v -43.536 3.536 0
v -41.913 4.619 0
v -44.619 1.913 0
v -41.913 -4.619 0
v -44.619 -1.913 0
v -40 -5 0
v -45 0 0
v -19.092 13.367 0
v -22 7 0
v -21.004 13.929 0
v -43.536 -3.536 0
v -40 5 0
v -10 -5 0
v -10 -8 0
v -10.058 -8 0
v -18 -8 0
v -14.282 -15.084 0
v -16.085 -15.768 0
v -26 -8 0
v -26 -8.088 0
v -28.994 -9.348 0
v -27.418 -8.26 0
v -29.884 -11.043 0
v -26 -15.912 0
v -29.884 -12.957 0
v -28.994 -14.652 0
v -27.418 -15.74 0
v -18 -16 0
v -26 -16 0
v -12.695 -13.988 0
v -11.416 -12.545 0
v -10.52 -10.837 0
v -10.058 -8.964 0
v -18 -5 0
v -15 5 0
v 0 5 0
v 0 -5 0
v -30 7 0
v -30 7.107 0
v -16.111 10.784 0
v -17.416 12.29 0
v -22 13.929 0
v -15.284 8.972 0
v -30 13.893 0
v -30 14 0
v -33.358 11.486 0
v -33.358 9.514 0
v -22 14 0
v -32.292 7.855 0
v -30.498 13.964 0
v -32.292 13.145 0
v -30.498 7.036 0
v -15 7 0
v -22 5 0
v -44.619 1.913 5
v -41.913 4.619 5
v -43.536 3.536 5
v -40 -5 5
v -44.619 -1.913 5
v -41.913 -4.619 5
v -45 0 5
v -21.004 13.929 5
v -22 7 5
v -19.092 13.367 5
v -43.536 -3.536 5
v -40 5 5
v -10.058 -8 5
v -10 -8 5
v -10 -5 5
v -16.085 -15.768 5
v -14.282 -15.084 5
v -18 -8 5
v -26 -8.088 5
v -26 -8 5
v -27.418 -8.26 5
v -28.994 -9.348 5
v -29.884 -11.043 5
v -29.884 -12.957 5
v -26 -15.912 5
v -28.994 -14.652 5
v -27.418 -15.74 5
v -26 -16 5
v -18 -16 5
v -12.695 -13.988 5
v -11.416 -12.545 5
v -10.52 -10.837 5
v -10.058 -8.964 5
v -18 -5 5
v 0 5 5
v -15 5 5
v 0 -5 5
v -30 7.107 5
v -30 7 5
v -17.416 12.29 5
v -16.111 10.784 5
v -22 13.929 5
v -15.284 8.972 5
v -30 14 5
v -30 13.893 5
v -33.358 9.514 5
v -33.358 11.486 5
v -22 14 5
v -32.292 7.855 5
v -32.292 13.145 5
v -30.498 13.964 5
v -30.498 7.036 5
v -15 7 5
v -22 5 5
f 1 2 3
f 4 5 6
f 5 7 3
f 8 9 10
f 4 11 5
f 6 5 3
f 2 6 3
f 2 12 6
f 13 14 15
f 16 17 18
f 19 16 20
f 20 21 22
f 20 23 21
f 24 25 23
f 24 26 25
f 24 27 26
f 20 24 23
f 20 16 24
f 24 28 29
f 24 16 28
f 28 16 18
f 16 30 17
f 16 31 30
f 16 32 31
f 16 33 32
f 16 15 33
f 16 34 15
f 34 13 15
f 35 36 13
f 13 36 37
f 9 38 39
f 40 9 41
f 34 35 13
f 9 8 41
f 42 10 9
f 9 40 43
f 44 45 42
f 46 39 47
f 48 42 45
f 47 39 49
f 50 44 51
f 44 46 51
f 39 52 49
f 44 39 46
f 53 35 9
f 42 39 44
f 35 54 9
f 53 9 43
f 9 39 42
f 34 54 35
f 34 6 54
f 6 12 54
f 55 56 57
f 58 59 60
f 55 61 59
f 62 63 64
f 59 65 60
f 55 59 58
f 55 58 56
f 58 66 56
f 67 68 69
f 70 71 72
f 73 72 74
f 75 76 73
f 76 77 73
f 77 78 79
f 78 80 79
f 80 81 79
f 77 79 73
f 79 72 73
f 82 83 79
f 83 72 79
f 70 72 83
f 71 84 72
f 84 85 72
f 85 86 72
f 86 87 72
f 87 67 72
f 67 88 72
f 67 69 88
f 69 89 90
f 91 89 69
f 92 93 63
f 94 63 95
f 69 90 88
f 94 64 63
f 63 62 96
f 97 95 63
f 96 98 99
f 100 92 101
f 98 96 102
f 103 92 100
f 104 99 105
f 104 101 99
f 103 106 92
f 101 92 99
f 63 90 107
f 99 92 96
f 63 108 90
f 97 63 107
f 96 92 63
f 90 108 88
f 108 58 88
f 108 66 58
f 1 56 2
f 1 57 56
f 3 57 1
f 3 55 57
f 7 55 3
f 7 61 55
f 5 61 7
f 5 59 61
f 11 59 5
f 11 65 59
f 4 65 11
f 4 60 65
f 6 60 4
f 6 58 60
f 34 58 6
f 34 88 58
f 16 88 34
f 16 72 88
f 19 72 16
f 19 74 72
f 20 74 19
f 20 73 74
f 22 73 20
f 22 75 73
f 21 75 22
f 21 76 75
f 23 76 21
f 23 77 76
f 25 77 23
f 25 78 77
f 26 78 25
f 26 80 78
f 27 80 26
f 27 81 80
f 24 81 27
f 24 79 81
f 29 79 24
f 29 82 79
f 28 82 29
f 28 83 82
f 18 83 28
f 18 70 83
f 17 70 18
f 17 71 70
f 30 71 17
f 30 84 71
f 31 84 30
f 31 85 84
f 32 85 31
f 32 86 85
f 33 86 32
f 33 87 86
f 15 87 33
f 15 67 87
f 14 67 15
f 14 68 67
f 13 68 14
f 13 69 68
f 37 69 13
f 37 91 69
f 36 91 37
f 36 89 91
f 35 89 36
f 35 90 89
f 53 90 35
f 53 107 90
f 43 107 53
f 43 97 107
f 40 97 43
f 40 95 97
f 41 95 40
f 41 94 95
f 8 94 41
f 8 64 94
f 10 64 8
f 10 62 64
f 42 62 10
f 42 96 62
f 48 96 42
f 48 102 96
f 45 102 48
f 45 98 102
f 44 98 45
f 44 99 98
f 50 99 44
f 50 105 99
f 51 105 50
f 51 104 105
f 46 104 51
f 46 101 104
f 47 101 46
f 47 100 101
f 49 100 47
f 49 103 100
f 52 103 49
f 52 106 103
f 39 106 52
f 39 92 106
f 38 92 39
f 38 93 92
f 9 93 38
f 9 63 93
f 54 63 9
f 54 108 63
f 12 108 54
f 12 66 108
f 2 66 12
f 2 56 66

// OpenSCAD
/* [Left Arm]*/
// arm length
leftLength=8;
// arm width
leftWidth=8;
// from trunk to arm
leftGap=3;
// quadrant of quarter circle
leftQuad=2;
// up from the bottom
leftUp=10;

/*[Trunk]*/
// Trunk Length excluding Radius of the top
trunkL=40;
// Radius of the top
trunkW=10;
// thickness of cactus
trunkT=5;

/*[Right Arm]*/
// arm length
rightLength=8;
// arm width
rightWidth=7;
// from trunk to arm
rightGap=2;
// quadrant of quarter circle
rightQuad=1;
// up from the bottom
rightUp=15;

cactus();//like thing:1052477 but customizable

module cactus(){
	linear_extrude(height=trunkT){
		translate([-rightUp, trunkW/2,0])
		arm(l=rightLength, w=rightWidth, g=rightGap, q=rightQuad);
		translate([-leftUp, -trunkW/2,0])
		arm(l=leftLength, w=leftWidth, g=leftGap, q=leftQuad);
		
		translate([-trunkL, -trunkW/2]){
			square([trunkL, trunkW]);
			translate([0, trunkW/2])
			circle(d=trunkW);
		}
	}
}

module arm(l=12, w=5, g=2, q=1, t=8){
	q1= q==1 ? 0:-1;
	q2= q==2 ? -1:1;//q=quadrand 1 or 2

	translate([-l-w, q2*w/2+q2*g])
	circle(r=w/2);
	
	translate([-l-w, q1*w+(q2*g)])//[-l-w, q1*w+(q2*g)]
	square([l, w]);
	
	translate([-w, g*q2])
	qCircle(r=w, q=q);
	
	translate([-w,g*q1])
	square([w, g]);
}

module qCircle(r=10, q=1){//q=quadrant 1, 2, 3 or 4
	rotate(-(q-1)*90)
	difference(){
		circle(r=r);
		translate([-r-1,-r-1])
		square([r+1, r*2+2]);
		translate([0,-r-1])
		square([r+2,r+1]);
	}
}
